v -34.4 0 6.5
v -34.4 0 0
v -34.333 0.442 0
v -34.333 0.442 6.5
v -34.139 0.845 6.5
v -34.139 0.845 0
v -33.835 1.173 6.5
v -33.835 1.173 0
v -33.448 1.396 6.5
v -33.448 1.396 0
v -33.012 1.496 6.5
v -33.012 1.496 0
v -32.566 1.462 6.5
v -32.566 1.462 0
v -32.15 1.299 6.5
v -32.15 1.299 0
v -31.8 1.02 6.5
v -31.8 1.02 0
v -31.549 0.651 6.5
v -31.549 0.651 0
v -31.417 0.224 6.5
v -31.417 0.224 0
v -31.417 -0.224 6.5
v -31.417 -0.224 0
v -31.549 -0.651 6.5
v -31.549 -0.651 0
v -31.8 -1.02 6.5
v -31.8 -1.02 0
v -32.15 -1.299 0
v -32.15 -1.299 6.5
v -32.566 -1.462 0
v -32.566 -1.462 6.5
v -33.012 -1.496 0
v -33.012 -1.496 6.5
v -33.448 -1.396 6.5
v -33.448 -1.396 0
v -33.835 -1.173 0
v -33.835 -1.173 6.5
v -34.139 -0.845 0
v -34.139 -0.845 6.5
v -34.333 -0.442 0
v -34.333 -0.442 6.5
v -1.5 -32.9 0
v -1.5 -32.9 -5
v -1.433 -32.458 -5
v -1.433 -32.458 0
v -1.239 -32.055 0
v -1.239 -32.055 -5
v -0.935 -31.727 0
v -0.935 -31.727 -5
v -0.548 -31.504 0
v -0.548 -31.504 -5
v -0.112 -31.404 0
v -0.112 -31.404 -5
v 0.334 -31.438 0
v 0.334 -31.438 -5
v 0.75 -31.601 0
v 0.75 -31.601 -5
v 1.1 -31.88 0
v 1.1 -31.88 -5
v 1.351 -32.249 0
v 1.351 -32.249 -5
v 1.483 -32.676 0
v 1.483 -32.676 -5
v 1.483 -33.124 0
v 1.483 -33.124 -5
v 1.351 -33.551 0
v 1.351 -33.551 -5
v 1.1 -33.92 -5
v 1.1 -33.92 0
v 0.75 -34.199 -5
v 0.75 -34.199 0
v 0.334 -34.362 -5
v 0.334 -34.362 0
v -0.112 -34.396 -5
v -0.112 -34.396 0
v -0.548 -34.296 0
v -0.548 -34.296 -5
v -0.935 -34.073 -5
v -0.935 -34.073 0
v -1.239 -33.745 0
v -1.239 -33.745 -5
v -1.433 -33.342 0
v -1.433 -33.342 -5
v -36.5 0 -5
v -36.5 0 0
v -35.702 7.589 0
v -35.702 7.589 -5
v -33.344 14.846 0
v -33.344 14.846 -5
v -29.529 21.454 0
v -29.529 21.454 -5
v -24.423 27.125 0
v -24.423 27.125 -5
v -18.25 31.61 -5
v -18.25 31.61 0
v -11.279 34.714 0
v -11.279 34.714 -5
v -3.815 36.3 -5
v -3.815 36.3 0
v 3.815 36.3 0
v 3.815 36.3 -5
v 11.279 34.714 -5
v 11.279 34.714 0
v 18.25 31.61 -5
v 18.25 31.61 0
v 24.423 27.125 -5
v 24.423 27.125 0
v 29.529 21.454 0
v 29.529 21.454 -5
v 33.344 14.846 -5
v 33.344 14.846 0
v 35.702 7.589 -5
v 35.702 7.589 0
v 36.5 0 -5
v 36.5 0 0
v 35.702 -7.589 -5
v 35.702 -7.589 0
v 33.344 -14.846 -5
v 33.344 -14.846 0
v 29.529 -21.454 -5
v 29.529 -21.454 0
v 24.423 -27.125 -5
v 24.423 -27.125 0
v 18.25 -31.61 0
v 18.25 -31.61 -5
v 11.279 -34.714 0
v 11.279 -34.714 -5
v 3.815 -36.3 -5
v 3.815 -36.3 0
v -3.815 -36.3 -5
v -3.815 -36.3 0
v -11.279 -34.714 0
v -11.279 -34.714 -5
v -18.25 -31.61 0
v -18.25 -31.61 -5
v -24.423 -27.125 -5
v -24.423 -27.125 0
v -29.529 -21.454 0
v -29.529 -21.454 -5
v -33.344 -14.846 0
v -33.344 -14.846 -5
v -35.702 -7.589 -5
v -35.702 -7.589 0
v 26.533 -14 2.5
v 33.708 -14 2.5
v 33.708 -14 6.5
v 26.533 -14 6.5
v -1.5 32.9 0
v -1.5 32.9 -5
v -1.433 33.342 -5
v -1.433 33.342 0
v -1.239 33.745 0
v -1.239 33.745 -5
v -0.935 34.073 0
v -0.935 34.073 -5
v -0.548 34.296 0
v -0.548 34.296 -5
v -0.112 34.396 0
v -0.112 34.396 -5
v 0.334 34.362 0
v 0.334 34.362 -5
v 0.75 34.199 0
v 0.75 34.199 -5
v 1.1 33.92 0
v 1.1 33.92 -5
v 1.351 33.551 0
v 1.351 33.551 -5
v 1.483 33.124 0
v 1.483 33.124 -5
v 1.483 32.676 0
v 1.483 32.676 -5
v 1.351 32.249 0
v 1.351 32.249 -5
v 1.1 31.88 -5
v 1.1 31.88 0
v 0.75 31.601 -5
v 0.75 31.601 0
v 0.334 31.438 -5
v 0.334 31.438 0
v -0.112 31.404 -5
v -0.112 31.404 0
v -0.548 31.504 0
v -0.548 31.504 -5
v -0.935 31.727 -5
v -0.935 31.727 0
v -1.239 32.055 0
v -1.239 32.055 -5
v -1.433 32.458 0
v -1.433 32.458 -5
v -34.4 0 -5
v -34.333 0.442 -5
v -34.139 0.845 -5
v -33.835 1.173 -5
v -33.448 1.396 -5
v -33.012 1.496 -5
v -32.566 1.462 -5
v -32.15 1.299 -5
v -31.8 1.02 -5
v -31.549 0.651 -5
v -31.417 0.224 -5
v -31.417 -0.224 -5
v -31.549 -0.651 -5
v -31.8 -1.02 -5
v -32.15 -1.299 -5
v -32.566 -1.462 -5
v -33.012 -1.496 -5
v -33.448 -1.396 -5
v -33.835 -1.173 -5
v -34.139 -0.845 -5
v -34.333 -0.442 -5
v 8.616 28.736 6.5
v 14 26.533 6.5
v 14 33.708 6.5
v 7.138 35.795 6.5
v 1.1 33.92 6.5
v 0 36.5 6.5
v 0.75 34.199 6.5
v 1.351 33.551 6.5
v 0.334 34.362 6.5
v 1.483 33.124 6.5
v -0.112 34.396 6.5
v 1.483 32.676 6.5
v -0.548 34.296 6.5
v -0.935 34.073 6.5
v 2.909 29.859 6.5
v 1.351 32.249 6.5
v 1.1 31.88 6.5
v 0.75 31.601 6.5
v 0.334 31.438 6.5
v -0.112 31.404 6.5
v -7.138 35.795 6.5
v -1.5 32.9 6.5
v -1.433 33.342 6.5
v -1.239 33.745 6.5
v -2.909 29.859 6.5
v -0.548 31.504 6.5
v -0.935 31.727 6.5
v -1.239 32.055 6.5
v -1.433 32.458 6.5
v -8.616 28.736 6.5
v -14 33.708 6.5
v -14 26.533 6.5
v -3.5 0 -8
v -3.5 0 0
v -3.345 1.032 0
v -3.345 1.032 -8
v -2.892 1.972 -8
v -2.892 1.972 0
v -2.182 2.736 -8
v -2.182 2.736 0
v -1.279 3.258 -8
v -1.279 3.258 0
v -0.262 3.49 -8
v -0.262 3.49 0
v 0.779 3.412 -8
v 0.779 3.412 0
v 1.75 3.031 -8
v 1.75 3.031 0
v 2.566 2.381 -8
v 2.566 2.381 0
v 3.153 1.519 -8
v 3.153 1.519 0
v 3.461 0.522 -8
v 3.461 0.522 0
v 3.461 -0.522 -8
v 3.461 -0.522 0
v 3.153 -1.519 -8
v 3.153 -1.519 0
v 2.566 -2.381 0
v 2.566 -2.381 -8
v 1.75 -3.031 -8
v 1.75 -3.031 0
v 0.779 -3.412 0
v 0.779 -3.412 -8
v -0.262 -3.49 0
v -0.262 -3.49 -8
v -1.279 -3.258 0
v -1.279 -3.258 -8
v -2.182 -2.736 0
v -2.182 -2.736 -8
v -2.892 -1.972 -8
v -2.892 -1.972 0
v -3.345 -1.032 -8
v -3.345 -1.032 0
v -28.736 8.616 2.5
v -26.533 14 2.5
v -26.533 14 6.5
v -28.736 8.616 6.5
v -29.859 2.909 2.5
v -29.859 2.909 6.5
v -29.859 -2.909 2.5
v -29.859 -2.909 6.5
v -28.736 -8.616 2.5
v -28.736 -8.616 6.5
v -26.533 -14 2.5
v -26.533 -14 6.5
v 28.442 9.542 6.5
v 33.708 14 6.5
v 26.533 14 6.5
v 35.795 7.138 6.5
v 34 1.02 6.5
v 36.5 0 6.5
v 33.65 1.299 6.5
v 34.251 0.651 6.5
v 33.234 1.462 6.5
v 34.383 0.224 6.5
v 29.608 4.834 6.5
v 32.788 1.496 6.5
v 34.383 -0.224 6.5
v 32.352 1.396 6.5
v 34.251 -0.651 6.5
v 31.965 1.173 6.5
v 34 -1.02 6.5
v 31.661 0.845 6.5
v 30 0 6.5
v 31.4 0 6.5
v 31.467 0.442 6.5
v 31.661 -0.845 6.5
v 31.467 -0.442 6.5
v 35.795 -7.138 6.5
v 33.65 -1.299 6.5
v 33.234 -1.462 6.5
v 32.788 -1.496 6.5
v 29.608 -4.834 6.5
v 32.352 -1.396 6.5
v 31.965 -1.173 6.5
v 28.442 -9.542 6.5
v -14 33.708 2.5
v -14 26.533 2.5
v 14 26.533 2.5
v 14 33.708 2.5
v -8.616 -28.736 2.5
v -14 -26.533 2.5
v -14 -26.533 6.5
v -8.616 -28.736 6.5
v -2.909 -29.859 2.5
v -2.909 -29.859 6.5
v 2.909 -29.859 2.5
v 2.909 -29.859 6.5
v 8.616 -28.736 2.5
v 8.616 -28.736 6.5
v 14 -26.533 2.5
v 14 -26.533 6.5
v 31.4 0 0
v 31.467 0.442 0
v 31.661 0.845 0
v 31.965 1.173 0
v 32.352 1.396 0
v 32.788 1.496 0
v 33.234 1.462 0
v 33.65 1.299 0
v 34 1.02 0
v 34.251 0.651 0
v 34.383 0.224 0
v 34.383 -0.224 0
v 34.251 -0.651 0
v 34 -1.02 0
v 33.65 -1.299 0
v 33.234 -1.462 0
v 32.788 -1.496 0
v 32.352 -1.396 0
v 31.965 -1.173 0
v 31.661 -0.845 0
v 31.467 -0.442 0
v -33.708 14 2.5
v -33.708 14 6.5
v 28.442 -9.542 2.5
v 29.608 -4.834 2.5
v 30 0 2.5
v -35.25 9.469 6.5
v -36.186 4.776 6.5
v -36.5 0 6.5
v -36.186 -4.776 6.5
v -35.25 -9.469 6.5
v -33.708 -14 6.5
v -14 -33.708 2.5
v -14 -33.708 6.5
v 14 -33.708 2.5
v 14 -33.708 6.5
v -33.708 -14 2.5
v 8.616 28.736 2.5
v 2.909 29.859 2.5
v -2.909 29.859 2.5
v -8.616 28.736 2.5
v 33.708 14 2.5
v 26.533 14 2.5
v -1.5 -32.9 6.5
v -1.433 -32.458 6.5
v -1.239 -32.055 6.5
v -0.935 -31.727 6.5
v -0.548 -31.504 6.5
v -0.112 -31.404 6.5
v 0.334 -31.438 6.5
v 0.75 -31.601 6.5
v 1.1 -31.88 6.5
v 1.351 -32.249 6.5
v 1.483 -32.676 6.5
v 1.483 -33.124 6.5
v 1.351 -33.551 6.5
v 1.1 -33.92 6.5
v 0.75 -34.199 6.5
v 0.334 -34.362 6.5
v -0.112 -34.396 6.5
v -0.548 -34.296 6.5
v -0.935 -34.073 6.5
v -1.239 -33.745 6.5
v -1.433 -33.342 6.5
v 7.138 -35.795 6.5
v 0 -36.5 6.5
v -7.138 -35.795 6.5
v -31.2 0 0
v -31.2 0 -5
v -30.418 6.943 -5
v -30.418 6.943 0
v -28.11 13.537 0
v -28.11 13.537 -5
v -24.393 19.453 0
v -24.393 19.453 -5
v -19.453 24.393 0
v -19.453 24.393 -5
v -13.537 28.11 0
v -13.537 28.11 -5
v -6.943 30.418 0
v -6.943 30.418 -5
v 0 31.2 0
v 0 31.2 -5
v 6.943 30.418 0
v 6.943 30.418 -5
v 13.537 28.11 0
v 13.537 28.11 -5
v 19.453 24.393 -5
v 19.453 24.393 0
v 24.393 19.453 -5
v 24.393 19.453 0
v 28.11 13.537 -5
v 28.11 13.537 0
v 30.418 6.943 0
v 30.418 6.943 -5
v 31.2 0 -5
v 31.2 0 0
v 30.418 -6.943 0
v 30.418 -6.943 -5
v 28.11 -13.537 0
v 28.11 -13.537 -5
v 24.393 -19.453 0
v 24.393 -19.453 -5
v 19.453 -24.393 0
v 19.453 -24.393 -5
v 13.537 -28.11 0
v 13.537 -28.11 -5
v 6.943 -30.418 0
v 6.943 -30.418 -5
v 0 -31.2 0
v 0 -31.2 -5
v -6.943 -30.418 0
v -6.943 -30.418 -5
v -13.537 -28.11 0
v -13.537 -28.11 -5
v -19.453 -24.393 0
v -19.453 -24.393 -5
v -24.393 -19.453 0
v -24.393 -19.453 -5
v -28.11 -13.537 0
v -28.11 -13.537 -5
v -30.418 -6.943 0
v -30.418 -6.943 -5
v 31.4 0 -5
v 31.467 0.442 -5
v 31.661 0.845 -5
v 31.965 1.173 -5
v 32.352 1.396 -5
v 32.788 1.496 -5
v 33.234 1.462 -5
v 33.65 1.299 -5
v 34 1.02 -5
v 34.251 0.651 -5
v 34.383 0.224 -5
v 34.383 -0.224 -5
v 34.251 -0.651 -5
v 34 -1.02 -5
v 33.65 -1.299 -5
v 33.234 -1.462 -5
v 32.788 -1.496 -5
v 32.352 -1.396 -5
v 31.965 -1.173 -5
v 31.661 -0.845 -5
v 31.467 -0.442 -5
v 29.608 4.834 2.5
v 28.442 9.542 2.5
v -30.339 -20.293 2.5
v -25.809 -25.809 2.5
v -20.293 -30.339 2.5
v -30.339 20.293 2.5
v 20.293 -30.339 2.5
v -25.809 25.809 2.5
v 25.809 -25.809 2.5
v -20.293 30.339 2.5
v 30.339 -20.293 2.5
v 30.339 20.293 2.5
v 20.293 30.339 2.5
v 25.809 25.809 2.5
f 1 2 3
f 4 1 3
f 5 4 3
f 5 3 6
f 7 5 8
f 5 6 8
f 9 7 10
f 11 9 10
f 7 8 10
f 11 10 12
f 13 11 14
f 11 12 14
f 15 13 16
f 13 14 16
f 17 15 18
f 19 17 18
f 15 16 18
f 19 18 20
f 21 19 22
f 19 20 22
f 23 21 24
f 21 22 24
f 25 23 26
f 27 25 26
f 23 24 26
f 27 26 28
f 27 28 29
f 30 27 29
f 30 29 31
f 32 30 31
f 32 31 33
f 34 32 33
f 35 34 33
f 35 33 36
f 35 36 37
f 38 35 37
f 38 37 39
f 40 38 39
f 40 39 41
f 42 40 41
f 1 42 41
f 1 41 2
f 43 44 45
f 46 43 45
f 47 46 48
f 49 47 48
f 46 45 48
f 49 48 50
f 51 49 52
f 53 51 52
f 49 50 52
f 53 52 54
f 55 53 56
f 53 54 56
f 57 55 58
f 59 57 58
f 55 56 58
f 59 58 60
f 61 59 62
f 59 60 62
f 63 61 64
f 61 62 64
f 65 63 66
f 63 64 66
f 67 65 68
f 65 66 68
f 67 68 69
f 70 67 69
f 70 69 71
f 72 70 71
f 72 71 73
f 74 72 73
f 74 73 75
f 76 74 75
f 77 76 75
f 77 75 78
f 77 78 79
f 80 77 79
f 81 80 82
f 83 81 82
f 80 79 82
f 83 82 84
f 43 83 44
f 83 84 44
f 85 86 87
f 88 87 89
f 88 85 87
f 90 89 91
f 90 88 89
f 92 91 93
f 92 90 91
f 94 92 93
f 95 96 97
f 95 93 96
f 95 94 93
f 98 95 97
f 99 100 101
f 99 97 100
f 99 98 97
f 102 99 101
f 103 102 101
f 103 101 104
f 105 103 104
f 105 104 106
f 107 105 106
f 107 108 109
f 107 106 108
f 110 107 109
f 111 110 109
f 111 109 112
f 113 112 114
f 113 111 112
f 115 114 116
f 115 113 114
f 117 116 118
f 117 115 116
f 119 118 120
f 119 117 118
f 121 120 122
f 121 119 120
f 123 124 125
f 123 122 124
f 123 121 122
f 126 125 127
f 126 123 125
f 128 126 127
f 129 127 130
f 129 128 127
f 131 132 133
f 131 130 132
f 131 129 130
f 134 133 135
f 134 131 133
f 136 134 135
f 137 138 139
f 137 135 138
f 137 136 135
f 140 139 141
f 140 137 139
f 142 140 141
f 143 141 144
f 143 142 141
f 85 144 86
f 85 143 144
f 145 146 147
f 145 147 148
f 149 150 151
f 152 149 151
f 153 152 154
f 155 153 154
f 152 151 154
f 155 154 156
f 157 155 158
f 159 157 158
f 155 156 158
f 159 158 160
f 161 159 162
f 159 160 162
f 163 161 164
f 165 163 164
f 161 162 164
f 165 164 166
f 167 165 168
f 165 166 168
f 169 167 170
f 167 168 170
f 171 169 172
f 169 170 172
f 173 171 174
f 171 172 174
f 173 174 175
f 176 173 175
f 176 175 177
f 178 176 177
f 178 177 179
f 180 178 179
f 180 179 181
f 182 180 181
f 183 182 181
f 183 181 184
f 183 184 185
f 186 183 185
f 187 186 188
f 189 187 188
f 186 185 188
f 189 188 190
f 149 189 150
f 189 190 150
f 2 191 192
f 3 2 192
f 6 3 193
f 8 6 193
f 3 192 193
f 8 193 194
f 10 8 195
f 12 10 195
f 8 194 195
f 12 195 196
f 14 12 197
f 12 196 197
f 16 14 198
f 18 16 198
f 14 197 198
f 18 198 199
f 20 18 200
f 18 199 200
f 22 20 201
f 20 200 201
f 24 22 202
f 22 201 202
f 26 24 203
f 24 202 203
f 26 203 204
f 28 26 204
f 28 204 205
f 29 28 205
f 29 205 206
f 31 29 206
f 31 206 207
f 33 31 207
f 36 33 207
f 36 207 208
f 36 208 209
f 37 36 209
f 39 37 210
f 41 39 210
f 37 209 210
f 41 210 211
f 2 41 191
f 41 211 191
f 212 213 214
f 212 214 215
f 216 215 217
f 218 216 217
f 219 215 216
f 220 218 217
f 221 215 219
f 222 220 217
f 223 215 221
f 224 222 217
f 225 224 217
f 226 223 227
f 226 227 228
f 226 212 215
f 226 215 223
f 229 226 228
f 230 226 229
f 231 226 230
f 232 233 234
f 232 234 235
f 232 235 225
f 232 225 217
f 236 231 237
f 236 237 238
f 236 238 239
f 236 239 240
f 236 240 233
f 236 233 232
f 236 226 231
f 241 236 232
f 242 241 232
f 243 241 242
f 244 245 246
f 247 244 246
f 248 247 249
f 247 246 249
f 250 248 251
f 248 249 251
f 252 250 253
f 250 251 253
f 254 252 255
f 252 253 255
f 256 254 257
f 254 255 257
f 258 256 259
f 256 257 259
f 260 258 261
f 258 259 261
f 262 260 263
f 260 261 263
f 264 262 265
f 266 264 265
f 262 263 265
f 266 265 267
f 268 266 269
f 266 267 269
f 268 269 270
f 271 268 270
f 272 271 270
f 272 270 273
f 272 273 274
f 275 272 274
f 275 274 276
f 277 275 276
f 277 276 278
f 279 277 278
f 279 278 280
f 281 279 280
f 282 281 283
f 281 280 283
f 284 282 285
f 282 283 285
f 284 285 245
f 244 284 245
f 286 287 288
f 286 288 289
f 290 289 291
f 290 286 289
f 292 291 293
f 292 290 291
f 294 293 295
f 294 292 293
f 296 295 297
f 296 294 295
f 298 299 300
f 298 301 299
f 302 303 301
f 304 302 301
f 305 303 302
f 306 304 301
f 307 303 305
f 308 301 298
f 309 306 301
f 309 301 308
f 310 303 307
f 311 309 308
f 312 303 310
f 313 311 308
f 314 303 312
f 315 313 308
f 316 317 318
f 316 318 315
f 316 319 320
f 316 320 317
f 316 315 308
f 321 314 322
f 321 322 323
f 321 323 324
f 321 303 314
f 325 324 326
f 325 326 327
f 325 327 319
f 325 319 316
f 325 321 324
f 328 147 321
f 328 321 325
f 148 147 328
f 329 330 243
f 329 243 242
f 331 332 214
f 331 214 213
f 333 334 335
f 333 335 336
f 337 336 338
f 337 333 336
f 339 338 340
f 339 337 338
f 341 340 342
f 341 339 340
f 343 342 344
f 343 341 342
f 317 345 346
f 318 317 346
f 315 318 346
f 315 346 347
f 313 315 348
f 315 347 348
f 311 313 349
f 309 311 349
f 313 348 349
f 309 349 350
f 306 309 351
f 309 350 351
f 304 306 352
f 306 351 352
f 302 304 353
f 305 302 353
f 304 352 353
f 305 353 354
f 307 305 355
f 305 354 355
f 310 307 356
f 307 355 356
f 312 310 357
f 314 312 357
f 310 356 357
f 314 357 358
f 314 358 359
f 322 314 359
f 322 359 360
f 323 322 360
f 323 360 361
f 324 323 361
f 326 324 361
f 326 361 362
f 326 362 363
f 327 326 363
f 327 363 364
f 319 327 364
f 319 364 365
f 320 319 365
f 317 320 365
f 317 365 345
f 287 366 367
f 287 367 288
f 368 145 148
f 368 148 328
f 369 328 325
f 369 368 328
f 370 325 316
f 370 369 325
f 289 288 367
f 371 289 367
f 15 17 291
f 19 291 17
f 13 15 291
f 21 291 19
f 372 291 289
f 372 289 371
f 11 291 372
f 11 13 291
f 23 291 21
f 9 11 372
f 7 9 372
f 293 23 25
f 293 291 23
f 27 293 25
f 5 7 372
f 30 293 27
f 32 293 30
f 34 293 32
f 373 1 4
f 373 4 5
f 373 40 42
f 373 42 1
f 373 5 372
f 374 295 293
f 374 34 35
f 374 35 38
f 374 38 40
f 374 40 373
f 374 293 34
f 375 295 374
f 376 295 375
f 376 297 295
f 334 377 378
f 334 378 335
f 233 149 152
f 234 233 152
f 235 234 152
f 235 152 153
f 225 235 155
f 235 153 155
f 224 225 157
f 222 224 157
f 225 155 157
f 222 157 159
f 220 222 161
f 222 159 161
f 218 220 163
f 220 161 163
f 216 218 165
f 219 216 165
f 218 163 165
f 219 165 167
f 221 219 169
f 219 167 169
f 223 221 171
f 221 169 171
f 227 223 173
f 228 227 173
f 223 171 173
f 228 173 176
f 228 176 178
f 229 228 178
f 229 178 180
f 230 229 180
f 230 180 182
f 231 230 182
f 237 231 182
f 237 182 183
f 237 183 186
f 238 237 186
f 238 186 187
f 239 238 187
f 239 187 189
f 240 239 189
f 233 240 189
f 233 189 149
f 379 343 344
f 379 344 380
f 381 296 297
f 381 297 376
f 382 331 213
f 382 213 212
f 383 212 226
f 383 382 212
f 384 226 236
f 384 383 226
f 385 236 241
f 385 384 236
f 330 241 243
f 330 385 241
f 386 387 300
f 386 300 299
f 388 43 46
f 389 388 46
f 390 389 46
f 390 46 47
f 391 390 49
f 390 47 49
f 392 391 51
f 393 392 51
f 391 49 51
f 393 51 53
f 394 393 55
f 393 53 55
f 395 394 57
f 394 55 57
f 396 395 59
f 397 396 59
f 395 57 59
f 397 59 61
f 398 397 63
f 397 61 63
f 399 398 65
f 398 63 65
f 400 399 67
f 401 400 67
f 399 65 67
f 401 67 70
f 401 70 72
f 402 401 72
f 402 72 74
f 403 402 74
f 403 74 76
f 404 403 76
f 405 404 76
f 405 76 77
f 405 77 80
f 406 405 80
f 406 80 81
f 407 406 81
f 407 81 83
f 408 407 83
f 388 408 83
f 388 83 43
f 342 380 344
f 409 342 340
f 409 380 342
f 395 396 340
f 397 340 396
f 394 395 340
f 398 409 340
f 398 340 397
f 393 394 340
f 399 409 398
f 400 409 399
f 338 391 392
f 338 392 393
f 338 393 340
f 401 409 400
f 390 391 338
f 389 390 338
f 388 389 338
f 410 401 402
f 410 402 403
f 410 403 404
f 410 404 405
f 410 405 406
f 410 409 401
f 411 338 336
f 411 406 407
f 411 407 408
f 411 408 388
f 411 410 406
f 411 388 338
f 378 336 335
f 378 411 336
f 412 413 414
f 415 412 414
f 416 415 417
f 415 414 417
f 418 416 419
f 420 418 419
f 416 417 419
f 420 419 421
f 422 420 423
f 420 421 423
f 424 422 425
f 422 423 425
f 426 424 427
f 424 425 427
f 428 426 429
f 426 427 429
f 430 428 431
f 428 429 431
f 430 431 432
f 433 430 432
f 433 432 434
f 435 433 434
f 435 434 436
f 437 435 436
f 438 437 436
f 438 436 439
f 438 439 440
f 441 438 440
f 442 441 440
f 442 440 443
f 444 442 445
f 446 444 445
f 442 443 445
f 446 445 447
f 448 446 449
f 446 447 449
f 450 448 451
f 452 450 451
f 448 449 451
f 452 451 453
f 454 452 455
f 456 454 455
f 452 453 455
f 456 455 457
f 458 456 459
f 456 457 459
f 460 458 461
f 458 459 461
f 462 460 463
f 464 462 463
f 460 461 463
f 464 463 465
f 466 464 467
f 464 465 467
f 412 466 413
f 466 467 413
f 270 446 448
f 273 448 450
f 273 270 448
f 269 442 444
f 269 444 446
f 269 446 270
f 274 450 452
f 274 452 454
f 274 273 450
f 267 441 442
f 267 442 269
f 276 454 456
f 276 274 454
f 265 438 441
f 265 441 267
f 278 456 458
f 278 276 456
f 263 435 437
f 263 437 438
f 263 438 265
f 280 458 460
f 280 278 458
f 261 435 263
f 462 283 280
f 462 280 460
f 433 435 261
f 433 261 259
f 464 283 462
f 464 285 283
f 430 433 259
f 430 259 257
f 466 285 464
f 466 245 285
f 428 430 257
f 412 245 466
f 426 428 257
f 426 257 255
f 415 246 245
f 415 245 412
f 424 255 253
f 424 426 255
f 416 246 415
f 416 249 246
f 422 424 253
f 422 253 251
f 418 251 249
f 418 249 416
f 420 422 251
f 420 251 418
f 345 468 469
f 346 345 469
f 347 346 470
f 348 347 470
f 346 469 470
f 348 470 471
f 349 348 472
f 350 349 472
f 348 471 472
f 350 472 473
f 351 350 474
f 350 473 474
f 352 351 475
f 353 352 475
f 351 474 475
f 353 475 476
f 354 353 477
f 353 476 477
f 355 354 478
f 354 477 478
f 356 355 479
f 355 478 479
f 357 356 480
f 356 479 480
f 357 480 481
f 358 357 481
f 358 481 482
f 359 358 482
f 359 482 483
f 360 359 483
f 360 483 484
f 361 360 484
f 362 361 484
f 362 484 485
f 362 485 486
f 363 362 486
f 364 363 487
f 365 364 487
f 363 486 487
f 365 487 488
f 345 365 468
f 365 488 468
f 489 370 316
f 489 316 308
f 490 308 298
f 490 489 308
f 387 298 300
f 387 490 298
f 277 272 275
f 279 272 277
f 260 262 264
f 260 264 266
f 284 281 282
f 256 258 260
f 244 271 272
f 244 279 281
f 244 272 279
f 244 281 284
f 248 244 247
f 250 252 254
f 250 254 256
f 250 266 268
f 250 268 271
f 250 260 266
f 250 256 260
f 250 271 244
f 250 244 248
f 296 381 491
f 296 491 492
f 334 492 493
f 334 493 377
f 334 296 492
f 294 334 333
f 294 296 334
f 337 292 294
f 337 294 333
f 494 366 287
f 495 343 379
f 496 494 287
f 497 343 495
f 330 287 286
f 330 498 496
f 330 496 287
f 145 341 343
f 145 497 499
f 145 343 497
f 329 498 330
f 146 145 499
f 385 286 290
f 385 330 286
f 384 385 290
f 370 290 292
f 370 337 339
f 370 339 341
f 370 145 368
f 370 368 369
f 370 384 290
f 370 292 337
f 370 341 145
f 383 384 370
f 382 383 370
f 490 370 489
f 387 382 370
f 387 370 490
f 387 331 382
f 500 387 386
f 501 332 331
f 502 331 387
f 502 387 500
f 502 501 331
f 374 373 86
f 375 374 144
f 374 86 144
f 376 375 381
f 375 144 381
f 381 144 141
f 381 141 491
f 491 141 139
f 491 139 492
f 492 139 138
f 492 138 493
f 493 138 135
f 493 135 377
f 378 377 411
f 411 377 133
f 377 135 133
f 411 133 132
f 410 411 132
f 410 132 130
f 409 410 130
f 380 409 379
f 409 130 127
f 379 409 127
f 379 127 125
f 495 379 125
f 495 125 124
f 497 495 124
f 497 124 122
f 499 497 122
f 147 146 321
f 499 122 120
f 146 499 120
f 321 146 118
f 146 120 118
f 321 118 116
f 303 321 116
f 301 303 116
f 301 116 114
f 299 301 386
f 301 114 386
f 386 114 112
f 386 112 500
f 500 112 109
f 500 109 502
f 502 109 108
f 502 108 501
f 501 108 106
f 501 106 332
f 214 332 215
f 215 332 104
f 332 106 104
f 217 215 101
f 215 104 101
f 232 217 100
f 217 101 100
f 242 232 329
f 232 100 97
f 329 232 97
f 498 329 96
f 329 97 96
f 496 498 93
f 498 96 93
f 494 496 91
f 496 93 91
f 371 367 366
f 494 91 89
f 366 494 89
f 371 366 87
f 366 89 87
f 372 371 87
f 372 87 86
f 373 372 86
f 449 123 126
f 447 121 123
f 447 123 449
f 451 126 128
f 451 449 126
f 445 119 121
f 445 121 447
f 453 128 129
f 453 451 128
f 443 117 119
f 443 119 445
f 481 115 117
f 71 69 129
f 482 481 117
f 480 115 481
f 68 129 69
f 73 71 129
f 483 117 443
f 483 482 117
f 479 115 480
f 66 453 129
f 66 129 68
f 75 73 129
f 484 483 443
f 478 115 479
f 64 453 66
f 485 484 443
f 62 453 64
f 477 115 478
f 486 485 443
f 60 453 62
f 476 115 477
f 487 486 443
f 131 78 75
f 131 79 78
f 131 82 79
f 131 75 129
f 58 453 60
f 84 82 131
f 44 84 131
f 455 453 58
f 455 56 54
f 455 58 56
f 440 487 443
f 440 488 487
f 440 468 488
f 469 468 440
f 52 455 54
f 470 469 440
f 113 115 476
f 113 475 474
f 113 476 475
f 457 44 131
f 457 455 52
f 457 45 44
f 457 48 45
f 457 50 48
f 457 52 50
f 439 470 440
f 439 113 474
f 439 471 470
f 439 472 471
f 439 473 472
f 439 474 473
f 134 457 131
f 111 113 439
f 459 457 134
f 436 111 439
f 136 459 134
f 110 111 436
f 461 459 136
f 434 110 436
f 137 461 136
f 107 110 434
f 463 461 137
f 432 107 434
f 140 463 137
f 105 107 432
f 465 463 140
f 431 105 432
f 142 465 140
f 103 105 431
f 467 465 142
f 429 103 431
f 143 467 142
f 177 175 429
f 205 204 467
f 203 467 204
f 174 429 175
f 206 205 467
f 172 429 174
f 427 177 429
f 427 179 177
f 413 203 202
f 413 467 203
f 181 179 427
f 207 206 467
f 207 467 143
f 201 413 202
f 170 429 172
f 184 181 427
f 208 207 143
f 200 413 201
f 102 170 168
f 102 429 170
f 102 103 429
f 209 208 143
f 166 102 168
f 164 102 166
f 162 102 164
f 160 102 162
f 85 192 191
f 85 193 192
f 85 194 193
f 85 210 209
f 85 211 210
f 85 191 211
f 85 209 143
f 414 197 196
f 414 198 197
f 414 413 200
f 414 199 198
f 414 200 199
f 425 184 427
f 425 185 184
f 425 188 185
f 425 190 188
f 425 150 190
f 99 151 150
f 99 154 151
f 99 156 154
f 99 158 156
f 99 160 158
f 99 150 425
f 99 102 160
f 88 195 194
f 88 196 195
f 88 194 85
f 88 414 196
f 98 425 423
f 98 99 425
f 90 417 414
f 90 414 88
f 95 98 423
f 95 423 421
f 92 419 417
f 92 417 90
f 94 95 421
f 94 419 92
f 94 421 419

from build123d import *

# Parameters (mm, degrees)
SKETCH_1_R          = 36.5
EXTRUDE_1_DEPTH     = 6.5
CUT_EXTRUDE_START   = -4
CUT_EXTRUDE_2_DEPTH = 4
CUT_EXTRUDE_3_DEPTH = 4
SKETCH_6_R          = 1.5
CUT_EXTRUDE_5_DEPTH = 53.026435588
EXTRUDE_START       = 5
SKETCH_7_R          = 36.5
SKETCH_7_R_2        = 1.5
EXTRUDE_2_DEPTH     = 5
SKETCH_8_R          = 31.2
CUT_EXTRUDE_6_DEPTH = 5
SKETCH_9_R          = 3.5
EXTRUDE_3_DEPTH     = 8


with BuildPart() as part:
    # 草图1 → 凸台-拉伸1 (new body)
    with BuildSketch(Plane.XY):
        with Locations(Location((0, 0, 0), (0, 0, 180))):
            Circle(SKETCH_1_R)
    extrude(amount=EXTRUDE_1_DEPTH)

    # 草图3 → 切除-拉伸2 (cut)
    with BuildSketch(Plane.XY.offset(6.5).offset(CUT_EXTRUDE_START)):
        with BuildLine():
            Line((14, 33.708307581), (14, 26.532998323))
            ThreePointArc((14, 26.532998323), (21.213203436, 21.213203436), (26.532998323, 14))
            Line((26.532998323, 14), (33.708307581, 14))
            ThreePointArc((33.708307581, 14), (25.809397513, 25.809397513), (14, 33.708307581))
        make_face()
        with BuildLine():
            ThreePointArc((26.532998323, -14), (21.213203436, -21.213203436), (14, -26.532998323))
            Line((14, -26.532998323), (14, -33.708307581))
            ThreePointArc((14, -33.708307581), (25.809397513, -25.809397513), (33.708307581, -14))
            Line((33.708307581, -14), (26.532998323, -14))
        make_face()
        with BuildLine():
            Line((-14, -33.708307581), (-14, -26.532998323))
            ThreePointArc((-14, -26.532998323), (-21.213203436, -21.213203436), (-26.532998323, -14))
            Line((-26.532998323, -14), (-33.708307581, -14))
            ThreePointArc((-33.708307581, -14), (-25.809397513, -25.809397513), (-14, -33.708307581))
        make_face()
        with BuildLine():
            Line((-33.708307581, 14), (-26.532998323, 14))
            ThreePointArc((-26.532998323, 14), (-21.213203436, 21.213203436), (-14, 26.532998323))
            Line((-14, 26.532998323), (-14, 33.708307581))
            ThreePointArc((-14, 33.708307581), (-25.809397513, 25.809397513), (-33.708307581, 14))
        make_face()
    extrude(amount=CUT_EXTRUDE_2_DEPTH, mode=Mode.SUBTRACT)

    # 草图4 → 切除-拉伸3 (cut)
    with BuildSketch(Plane.XY.offset(6.5).offset(CUT_EXTRUDE_START)):
        with BuildLine():
            ThreePointArc((26.532998323, -14), (29.120353275, -7.211450974), (30, 0))
            ThreePointArc((30, 0), (29.120353275, 7.211450974), (26.532998323, 14))
            ThreePointArc((26.532998323, 14), (21.213203436, 21.213203436), (14, 26.532998323))
            ThreePointArc((14, 26.532998323), (0, 30), (-14, 26.532998323))
            ThreePointArc((-14, 26.532998323), (-21.213203436, 21.213203436), (-26.532998323, 14))
            ThreePointArc((-26.532998323, 14), (-30, 0), (-26.532998323, -14))
            ThreePointArc((-26.532998323, -14), (-21.213203436, -21.213203436), (-14, -26.532998323))
            ThreePointArc((-14, -26.532998323), (0, -30), (14, -26.532998323))
            ThreePointArc((14, -26.532998323), (21.213203436, -21.213203436), (26.532998323, -14))
        make_face()
    extrude(amount=CUT_EXTRUDE_3_DEPTH, mode=Mode.SUBTRACT)

    # 草图6 → 切除-拉伸5 (cut, through all)
    with BuildSketch(Plane(origin=(0, 0, 0), x_dir=(-1, 0, 0), z_dir=(0, 0, -1))):
        with Locations((32.9, 0)):
            Circle(SKETCH_6_R)
        with Locations((0, -32.9)):
            Circle(SKETCH_6_R)
        with Locations((0, 32.9)):
            Circle(SKETCH_6_R)
        with Locations((-32.9, 0)):
            Circle(SKETCH_6_R)
    extrude(amount=-CUT_EXTRUDE_5_DEPTH, mode=Mode.SUBTRACT)

    # 草图7 → 凸台-拉伸2 (add)
    with BuildSketch(Plane(origin=(0, 0, 0), x_dir=(-1, 0, 0), z_dir=(0, 0, -1)).offset(EXTRUDE_START)):
        Circle(SKETCH_7_R)
        with Locations((0, -32.9)):
            Circle(SKETCH_7_R_2, mode=Mode.SUBTRACT)
        with Locations((-32.9, 0)):
            Circle(SKETCH_7_R_2, mode=Mode.SUBTRACT)
        with Locations((0, 32.9)):
            Circle(SKETCH_7_R_2, mode=Mode.SUBTRACT)
        with Locations((32.9, 0)):
            Circle(SKETCH_7_R_2, mode=Mode.SUBTRACT)
    extrude(amount=-EXTRUDE_2_DEPTH)

    # 草图8 → 切除-拉伸6 (cut)
    with BuildSketch(Plane(origin=(0, 0, -5), x_dir=(-1, 0, 0), z_dir=(0, 0, -1))):
        Circle(SKETCH_8_R)
    extrude(amount=-CUT_EXTRUDE_6_DEPTH, mode=Mode.SUBTRACT)

    # 草图9 → 凸台-拉伸3 (add)
    with BuildSketch(Plane(origin=(0, 0, 0), x_dir=(-1, 0, 0), z_dir=(0, 0, -1))):
        Circle(SKETCH_9_R)
    extrude(amount=EXTRUDE_3_DEPTH)


solid = part.part
